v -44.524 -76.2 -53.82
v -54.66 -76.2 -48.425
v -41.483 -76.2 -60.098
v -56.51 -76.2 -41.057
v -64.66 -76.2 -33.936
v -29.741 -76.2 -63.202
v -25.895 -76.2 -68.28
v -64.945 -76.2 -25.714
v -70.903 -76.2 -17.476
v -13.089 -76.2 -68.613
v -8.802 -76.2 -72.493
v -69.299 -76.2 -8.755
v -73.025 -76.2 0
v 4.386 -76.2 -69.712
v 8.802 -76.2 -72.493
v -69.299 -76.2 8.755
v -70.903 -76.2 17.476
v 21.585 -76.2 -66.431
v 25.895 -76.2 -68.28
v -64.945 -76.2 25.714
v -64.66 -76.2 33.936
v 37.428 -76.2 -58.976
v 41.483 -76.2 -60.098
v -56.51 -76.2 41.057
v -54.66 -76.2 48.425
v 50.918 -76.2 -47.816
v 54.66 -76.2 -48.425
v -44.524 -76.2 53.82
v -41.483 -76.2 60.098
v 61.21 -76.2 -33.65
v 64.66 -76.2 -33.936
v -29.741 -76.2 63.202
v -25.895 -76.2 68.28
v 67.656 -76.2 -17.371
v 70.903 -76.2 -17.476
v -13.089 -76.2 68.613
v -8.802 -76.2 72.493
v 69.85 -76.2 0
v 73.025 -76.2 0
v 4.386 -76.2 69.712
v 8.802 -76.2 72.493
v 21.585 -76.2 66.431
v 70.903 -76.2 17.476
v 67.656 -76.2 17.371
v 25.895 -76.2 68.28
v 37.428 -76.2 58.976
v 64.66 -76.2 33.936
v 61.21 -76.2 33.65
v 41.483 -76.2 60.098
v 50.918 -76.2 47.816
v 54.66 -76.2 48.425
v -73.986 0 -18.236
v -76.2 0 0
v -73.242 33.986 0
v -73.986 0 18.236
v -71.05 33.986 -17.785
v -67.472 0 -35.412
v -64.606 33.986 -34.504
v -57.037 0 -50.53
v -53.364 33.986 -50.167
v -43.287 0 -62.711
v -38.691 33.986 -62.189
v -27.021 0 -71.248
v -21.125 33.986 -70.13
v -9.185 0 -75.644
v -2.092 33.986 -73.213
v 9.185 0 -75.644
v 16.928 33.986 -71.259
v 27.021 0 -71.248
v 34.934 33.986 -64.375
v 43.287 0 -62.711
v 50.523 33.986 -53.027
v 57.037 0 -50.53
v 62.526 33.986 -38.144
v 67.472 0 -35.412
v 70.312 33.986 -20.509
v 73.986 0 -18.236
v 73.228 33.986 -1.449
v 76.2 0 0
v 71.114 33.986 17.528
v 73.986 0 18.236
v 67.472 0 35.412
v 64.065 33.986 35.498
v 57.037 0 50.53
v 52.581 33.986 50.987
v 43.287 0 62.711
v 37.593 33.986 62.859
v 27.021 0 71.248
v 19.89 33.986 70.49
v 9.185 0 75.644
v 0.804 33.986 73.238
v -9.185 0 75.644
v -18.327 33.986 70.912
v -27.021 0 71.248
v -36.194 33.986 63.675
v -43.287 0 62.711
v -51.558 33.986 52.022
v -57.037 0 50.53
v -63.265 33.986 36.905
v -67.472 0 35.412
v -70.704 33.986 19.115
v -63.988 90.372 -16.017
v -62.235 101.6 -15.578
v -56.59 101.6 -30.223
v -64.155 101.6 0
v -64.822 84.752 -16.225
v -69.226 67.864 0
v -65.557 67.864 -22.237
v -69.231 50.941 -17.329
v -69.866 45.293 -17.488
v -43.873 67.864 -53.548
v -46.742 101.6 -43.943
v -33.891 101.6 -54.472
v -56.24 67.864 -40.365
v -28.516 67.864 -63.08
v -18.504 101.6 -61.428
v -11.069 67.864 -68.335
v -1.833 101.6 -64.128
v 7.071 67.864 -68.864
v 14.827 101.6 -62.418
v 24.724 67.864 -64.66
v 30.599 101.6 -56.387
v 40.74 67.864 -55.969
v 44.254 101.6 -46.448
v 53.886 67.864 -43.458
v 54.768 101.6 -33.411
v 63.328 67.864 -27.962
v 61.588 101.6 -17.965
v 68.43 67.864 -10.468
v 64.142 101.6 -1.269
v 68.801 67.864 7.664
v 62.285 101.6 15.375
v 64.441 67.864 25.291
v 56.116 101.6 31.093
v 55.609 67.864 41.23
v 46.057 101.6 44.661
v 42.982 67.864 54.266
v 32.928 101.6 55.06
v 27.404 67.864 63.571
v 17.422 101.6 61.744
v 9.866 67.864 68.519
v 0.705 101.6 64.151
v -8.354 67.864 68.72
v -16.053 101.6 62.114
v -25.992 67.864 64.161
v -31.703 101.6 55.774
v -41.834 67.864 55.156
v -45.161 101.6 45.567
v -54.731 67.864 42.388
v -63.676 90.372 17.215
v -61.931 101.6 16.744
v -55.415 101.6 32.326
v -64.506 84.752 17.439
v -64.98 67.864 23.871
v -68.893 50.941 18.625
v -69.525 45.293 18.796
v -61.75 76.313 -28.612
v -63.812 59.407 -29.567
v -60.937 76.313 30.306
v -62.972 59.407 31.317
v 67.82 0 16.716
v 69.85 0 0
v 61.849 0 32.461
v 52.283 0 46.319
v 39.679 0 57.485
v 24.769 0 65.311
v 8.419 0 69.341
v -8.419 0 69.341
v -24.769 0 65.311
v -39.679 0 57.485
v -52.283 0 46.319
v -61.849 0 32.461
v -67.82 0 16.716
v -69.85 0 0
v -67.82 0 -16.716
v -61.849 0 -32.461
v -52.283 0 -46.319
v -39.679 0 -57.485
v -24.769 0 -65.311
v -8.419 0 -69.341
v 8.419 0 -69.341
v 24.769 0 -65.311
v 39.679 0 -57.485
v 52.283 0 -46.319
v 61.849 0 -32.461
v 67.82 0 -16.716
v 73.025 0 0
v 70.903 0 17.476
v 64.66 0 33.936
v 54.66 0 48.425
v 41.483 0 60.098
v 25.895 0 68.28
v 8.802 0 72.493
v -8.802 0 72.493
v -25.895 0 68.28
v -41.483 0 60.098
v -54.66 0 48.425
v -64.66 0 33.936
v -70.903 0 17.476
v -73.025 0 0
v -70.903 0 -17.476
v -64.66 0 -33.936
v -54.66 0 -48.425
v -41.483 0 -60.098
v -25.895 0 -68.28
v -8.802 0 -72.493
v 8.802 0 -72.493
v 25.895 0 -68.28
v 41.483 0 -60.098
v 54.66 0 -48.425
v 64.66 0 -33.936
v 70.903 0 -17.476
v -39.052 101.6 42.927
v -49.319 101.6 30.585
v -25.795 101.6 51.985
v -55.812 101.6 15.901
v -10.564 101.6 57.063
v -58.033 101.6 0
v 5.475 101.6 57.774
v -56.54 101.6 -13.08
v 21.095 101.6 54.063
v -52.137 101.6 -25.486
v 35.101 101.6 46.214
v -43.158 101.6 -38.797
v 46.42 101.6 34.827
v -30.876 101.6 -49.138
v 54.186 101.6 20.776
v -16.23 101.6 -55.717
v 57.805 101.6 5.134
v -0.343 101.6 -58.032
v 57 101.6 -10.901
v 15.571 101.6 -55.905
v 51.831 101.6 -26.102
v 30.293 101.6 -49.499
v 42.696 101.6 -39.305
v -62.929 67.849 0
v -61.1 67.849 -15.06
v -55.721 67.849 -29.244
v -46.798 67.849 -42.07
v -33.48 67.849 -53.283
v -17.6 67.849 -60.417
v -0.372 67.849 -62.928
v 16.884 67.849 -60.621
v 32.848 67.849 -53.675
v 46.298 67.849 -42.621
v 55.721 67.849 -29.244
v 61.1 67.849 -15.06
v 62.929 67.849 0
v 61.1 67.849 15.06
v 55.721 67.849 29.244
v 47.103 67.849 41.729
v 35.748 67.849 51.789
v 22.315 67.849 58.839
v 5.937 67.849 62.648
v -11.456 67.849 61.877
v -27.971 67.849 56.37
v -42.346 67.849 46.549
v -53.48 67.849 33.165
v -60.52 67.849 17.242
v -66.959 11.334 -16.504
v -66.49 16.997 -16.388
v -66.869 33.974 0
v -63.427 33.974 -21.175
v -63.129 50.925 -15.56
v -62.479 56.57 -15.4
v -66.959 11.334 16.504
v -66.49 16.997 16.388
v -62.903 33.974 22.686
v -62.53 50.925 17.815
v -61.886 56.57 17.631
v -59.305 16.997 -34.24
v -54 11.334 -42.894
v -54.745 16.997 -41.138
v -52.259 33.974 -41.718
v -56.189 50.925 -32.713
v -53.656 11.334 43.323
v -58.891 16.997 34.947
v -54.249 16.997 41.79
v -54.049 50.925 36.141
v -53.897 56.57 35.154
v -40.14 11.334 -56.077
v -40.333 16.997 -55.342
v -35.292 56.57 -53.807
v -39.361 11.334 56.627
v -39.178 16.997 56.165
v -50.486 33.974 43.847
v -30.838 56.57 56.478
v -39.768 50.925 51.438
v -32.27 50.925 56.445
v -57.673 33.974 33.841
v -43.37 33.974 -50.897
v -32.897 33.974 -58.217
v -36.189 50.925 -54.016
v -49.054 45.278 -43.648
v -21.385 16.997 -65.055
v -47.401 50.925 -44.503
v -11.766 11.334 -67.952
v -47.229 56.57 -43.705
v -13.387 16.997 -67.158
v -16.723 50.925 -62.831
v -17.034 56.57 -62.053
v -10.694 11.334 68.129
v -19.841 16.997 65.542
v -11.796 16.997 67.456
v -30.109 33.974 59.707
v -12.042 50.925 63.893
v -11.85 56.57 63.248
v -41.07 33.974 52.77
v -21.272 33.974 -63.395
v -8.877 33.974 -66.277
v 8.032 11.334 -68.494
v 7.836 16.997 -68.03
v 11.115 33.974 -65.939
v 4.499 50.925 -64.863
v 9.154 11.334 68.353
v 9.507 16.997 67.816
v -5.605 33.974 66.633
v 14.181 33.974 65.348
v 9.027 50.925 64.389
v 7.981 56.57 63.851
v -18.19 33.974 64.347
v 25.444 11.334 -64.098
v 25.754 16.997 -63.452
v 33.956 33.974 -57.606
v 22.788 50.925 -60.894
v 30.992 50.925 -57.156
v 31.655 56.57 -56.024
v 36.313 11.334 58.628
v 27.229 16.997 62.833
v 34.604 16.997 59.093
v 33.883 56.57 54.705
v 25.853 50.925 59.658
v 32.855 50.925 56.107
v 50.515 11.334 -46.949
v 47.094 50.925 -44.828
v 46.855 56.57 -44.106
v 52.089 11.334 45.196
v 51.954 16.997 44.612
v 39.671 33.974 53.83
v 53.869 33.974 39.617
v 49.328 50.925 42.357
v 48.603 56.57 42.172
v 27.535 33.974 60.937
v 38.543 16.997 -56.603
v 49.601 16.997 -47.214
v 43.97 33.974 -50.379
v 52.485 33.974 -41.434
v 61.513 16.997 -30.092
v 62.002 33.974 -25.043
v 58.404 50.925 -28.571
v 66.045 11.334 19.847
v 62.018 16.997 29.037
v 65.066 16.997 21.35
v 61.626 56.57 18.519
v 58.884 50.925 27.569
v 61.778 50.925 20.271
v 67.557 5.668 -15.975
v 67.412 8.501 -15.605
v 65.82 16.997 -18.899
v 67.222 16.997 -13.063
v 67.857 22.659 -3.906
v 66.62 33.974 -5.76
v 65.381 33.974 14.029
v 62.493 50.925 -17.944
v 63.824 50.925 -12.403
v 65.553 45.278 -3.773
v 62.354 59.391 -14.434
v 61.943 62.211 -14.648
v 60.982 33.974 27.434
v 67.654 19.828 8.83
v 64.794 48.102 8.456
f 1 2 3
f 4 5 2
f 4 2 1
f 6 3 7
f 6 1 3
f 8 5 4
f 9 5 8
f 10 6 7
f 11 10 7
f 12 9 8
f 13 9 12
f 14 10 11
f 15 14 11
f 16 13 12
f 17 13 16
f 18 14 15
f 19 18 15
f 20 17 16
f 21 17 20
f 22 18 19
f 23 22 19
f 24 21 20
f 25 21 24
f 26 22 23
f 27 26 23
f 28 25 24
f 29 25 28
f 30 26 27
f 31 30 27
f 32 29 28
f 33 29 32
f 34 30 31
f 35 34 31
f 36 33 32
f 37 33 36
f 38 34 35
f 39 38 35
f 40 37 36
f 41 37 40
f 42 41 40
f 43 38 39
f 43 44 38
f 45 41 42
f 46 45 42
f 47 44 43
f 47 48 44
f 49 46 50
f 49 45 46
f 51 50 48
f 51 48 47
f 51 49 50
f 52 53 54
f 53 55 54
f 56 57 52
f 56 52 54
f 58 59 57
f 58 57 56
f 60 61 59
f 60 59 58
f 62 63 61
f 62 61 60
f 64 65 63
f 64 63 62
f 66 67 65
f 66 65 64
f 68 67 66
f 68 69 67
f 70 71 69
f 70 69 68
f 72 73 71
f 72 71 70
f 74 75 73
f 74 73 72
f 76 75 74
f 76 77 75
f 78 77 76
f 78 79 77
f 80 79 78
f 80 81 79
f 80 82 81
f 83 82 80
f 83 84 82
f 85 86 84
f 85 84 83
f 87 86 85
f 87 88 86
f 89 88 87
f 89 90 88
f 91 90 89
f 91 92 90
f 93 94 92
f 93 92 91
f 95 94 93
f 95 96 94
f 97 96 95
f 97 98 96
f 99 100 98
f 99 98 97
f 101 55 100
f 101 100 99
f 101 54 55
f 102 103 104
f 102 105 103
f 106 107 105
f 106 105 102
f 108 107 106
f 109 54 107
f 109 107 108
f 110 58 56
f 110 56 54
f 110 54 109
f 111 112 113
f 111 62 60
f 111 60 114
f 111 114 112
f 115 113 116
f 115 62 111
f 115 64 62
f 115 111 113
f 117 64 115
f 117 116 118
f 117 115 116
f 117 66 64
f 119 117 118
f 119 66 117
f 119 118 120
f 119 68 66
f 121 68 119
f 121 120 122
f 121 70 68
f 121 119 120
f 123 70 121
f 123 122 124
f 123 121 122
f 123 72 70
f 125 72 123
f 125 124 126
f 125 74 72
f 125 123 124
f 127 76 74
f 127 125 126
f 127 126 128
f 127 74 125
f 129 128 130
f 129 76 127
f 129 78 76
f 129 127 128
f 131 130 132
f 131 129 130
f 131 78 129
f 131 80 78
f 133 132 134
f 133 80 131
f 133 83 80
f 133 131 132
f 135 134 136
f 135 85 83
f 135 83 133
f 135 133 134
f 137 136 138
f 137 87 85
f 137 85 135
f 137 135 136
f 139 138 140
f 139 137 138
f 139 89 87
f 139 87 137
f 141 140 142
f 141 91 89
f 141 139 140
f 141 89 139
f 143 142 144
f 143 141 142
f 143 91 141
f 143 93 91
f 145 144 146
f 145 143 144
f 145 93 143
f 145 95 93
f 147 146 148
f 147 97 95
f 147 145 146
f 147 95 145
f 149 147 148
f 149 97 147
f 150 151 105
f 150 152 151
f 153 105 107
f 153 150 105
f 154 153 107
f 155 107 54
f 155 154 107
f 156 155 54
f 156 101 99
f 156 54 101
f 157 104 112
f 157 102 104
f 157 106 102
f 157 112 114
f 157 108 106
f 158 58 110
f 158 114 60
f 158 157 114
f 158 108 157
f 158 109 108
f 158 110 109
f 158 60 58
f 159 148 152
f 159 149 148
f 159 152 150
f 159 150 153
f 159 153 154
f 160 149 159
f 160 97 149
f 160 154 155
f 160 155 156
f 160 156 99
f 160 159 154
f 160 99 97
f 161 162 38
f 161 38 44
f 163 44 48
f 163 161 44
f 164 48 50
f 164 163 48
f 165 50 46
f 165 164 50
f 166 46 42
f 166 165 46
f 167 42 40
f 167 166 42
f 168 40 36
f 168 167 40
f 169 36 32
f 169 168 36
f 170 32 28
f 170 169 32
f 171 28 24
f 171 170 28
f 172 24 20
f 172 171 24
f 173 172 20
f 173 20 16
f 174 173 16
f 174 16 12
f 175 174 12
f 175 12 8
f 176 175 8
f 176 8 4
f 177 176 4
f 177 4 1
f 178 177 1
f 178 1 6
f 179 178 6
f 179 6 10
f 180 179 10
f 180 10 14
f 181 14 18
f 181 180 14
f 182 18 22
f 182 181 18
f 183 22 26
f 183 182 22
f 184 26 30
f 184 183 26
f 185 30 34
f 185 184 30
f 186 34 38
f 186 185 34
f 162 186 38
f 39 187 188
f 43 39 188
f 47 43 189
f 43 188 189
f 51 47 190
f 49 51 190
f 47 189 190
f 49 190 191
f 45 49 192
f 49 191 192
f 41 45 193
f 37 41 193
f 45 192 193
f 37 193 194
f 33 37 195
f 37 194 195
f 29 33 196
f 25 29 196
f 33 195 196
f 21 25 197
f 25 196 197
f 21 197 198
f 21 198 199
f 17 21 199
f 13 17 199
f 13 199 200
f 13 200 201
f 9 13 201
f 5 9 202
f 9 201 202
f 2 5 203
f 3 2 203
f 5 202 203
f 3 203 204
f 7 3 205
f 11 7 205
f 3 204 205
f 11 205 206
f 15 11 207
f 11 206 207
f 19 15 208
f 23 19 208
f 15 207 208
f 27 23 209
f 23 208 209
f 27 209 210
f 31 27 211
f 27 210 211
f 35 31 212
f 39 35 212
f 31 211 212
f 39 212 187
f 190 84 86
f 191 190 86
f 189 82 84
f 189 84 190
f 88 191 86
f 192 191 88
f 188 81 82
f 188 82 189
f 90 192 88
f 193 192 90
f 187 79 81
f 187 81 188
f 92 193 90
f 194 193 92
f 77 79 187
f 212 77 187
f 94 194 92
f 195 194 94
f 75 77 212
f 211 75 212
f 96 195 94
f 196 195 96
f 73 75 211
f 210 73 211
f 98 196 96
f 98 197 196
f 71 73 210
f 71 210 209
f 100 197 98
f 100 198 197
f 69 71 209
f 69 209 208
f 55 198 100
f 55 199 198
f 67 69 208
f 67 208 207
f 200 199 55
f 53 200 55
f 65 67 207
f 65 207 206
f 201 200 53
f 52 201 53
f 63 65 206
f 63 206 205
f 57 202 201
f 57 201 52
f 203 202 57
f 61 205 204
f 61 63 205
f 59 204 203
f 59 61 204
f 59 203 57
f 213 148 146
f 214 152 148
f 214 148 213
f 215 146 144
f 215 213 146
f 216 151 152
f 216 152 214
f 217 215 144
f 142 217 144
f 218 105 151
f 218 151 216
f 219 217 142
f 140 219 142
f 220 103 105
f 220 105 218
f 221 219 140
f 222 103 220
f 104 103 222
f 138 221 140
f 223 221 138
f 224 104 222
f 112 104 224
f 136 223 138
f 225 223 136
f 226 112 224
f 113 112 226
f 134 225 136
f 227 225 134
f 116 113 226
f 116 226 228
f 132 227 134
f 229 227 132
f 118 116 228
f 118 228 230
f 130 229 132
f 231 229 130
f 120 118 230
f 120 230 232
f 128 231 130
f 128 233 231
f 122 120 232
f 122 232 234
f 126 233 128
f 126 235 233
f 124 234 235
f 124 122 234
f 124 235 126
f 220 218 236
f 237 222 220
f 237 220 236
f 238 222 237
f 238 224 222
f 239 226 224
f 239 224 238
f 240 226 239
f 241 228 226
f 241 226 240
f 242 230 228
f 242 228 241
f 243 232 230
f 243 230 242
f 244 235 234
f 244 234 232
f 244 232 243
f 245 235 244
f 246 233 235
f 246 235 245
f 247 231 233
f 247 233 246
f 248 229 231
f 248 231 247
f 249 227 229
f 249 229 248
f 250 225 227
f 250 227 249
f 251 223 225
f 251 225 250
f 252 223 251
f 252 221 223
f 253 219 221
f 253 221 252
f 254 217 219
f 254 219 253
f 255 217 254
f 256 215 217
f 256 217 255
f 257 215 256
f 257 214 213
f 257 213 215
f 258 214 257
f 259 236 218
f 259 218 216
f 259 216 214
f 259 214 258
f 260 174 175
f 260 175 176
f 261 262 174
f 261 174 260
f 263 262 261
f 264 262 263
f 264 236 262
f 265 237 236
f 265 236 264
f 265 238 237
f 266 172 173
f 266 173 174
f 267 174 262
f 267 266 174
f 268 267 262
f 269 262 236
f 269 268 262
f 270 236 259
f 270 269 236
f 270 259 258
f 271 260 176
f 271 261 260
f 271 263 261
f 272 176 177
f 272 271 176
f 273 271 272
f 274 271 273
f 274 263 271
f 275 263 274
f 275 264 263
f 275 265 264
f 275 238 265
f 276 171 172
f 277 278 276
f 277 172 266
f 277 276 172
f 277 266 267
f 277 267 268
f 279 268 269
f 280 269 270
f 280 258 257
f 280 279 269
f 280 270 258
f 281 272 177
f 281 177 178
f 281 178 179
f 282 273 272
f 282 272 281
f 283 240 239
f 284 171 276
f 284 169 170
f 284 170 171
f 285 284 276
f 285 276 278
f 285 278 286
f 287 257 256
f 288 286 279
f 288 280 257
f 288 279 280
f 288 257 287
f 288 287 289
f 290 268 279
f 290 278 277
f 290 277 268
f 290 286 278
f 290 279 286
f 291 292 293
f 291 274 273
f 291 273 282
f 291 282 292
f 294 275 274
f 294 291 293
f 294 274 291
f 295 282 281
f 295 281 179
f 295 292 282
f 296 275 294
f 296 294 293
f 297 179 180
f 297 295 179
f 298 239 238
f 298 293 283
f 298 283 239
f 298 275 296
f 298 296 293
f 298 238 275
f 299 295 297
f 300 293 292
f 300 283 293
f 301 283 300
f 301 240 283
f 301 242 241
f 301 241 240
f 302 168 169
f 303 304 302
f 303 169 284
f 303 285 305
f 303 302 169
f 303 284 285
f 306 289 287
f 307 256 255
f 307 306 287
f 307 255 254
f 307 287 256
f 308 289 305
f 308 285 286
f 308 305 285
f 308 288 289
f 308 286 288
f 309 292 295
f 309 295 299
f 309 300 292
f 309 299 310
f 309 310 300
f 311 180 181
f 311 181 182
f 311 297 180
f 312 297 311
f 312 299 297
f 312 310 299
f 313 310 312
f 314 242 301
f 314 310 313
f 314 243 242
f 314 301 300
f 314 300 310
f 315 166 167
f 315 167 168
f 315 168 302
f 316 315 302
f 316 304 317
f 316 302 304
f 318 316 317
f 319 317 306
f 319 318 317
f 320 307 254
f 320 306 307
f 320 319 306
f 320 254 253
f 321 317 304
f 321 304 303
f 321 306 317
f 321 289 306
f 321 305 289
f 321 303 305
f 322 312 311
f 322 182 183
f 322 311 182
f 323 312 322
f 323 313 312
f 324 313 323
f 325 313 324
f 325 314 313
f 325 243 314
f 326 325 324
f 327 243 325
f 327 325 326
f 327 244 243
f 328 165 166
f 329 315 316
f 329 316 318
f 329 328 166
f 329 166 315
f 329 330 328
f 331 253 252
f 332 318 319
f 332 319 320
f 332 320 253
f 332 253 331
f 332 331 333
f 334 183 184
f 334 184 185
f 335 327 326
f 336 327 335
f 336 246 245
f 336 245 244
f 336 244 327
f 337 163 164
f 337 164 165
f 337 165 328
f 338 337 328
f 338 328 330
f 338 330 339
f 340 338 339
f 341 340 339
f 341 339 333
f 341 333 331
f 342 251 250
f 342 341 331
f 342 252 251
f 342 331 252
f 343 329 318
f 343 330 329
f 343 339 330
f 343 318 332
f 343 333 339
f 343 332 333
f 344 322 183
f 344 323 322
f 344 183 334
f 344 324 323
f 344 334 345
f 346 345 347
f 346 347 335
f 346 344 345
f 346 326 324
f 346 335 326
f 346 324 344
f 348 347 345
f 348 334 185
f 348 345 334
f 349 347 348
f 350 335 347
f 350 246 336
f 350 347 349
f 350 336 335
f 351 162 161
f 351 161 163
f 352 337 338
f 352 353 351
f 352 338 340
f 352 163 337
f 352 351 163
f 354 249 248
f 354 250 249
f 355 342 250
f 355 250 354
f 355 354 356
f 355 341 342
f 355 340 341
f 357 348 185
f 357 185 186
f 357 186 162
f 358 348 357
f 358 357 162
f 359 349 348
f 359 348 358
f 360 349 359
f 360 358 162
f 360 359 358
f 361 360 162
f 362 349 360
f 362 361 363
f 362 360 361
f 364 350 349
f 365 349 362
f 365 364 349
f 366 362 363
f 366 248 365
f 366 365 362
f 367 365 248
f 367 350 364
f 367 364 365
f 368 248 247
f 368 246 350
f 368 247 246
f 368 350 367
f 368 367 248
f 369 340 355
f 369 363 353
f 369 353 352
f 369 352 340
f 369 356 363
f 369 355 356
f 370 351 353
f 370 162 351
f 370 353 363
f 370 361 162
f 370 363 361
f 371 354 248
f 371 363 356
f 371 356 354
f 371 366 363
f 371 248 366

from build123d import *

# Parameters (mm, degrees)
SKETCH7_R           = 317.5
CUT_EXTRUDE2_DEPTH  = 279.4
SKETCH8_R           = 73.025
SKETCH8_R_2         = 69.85
BOSS_EXTRUDE1_DEPTH = 76.2


with BuildPart() as part:
    # Sketch2 → Revolve1 (revolve)
    with BuildSketch(Plane.XY):
        with BuildLine():
            Line((-76.2, 0), (-69.85, 0))
            ThreePointArc((-69.85, 0), (-46.178344337, 164.977710697), (0, 325.12))
            Line((0, 325.12), (0, 330.2))
            ThreePointArc((0, 330.2), (-50.970594074, 168.070137094), (-76.2, 0))
        make_face()
    revolve(axis=Axis((0, 330.2, 0), (0, -1, 0)))

    # Sketch7 → Cut-Extrude2 (cut)
    with BuildSketch(Plane(origin=(0, 381, 0), x_dir=(1, 0, 0), z_dir=(0, 1, 0))):
        Circle(SKETCH7_R)
    extrude(amount=-CUT_EXTRUDE2_DEPTH, mode=Mode.SUBTRACT)

    # Sketch8 → Boss-Extrude1 (add)
    with BuildSketch(Plane.XZ):
        Circle(SKETCH8_R)
        Circle(SKETCH8_R_2, mode=Mode.SUBTRACT)
    extrude(amount=BOSS_EXTRUDE1_DEPTH)


solid = part.part
